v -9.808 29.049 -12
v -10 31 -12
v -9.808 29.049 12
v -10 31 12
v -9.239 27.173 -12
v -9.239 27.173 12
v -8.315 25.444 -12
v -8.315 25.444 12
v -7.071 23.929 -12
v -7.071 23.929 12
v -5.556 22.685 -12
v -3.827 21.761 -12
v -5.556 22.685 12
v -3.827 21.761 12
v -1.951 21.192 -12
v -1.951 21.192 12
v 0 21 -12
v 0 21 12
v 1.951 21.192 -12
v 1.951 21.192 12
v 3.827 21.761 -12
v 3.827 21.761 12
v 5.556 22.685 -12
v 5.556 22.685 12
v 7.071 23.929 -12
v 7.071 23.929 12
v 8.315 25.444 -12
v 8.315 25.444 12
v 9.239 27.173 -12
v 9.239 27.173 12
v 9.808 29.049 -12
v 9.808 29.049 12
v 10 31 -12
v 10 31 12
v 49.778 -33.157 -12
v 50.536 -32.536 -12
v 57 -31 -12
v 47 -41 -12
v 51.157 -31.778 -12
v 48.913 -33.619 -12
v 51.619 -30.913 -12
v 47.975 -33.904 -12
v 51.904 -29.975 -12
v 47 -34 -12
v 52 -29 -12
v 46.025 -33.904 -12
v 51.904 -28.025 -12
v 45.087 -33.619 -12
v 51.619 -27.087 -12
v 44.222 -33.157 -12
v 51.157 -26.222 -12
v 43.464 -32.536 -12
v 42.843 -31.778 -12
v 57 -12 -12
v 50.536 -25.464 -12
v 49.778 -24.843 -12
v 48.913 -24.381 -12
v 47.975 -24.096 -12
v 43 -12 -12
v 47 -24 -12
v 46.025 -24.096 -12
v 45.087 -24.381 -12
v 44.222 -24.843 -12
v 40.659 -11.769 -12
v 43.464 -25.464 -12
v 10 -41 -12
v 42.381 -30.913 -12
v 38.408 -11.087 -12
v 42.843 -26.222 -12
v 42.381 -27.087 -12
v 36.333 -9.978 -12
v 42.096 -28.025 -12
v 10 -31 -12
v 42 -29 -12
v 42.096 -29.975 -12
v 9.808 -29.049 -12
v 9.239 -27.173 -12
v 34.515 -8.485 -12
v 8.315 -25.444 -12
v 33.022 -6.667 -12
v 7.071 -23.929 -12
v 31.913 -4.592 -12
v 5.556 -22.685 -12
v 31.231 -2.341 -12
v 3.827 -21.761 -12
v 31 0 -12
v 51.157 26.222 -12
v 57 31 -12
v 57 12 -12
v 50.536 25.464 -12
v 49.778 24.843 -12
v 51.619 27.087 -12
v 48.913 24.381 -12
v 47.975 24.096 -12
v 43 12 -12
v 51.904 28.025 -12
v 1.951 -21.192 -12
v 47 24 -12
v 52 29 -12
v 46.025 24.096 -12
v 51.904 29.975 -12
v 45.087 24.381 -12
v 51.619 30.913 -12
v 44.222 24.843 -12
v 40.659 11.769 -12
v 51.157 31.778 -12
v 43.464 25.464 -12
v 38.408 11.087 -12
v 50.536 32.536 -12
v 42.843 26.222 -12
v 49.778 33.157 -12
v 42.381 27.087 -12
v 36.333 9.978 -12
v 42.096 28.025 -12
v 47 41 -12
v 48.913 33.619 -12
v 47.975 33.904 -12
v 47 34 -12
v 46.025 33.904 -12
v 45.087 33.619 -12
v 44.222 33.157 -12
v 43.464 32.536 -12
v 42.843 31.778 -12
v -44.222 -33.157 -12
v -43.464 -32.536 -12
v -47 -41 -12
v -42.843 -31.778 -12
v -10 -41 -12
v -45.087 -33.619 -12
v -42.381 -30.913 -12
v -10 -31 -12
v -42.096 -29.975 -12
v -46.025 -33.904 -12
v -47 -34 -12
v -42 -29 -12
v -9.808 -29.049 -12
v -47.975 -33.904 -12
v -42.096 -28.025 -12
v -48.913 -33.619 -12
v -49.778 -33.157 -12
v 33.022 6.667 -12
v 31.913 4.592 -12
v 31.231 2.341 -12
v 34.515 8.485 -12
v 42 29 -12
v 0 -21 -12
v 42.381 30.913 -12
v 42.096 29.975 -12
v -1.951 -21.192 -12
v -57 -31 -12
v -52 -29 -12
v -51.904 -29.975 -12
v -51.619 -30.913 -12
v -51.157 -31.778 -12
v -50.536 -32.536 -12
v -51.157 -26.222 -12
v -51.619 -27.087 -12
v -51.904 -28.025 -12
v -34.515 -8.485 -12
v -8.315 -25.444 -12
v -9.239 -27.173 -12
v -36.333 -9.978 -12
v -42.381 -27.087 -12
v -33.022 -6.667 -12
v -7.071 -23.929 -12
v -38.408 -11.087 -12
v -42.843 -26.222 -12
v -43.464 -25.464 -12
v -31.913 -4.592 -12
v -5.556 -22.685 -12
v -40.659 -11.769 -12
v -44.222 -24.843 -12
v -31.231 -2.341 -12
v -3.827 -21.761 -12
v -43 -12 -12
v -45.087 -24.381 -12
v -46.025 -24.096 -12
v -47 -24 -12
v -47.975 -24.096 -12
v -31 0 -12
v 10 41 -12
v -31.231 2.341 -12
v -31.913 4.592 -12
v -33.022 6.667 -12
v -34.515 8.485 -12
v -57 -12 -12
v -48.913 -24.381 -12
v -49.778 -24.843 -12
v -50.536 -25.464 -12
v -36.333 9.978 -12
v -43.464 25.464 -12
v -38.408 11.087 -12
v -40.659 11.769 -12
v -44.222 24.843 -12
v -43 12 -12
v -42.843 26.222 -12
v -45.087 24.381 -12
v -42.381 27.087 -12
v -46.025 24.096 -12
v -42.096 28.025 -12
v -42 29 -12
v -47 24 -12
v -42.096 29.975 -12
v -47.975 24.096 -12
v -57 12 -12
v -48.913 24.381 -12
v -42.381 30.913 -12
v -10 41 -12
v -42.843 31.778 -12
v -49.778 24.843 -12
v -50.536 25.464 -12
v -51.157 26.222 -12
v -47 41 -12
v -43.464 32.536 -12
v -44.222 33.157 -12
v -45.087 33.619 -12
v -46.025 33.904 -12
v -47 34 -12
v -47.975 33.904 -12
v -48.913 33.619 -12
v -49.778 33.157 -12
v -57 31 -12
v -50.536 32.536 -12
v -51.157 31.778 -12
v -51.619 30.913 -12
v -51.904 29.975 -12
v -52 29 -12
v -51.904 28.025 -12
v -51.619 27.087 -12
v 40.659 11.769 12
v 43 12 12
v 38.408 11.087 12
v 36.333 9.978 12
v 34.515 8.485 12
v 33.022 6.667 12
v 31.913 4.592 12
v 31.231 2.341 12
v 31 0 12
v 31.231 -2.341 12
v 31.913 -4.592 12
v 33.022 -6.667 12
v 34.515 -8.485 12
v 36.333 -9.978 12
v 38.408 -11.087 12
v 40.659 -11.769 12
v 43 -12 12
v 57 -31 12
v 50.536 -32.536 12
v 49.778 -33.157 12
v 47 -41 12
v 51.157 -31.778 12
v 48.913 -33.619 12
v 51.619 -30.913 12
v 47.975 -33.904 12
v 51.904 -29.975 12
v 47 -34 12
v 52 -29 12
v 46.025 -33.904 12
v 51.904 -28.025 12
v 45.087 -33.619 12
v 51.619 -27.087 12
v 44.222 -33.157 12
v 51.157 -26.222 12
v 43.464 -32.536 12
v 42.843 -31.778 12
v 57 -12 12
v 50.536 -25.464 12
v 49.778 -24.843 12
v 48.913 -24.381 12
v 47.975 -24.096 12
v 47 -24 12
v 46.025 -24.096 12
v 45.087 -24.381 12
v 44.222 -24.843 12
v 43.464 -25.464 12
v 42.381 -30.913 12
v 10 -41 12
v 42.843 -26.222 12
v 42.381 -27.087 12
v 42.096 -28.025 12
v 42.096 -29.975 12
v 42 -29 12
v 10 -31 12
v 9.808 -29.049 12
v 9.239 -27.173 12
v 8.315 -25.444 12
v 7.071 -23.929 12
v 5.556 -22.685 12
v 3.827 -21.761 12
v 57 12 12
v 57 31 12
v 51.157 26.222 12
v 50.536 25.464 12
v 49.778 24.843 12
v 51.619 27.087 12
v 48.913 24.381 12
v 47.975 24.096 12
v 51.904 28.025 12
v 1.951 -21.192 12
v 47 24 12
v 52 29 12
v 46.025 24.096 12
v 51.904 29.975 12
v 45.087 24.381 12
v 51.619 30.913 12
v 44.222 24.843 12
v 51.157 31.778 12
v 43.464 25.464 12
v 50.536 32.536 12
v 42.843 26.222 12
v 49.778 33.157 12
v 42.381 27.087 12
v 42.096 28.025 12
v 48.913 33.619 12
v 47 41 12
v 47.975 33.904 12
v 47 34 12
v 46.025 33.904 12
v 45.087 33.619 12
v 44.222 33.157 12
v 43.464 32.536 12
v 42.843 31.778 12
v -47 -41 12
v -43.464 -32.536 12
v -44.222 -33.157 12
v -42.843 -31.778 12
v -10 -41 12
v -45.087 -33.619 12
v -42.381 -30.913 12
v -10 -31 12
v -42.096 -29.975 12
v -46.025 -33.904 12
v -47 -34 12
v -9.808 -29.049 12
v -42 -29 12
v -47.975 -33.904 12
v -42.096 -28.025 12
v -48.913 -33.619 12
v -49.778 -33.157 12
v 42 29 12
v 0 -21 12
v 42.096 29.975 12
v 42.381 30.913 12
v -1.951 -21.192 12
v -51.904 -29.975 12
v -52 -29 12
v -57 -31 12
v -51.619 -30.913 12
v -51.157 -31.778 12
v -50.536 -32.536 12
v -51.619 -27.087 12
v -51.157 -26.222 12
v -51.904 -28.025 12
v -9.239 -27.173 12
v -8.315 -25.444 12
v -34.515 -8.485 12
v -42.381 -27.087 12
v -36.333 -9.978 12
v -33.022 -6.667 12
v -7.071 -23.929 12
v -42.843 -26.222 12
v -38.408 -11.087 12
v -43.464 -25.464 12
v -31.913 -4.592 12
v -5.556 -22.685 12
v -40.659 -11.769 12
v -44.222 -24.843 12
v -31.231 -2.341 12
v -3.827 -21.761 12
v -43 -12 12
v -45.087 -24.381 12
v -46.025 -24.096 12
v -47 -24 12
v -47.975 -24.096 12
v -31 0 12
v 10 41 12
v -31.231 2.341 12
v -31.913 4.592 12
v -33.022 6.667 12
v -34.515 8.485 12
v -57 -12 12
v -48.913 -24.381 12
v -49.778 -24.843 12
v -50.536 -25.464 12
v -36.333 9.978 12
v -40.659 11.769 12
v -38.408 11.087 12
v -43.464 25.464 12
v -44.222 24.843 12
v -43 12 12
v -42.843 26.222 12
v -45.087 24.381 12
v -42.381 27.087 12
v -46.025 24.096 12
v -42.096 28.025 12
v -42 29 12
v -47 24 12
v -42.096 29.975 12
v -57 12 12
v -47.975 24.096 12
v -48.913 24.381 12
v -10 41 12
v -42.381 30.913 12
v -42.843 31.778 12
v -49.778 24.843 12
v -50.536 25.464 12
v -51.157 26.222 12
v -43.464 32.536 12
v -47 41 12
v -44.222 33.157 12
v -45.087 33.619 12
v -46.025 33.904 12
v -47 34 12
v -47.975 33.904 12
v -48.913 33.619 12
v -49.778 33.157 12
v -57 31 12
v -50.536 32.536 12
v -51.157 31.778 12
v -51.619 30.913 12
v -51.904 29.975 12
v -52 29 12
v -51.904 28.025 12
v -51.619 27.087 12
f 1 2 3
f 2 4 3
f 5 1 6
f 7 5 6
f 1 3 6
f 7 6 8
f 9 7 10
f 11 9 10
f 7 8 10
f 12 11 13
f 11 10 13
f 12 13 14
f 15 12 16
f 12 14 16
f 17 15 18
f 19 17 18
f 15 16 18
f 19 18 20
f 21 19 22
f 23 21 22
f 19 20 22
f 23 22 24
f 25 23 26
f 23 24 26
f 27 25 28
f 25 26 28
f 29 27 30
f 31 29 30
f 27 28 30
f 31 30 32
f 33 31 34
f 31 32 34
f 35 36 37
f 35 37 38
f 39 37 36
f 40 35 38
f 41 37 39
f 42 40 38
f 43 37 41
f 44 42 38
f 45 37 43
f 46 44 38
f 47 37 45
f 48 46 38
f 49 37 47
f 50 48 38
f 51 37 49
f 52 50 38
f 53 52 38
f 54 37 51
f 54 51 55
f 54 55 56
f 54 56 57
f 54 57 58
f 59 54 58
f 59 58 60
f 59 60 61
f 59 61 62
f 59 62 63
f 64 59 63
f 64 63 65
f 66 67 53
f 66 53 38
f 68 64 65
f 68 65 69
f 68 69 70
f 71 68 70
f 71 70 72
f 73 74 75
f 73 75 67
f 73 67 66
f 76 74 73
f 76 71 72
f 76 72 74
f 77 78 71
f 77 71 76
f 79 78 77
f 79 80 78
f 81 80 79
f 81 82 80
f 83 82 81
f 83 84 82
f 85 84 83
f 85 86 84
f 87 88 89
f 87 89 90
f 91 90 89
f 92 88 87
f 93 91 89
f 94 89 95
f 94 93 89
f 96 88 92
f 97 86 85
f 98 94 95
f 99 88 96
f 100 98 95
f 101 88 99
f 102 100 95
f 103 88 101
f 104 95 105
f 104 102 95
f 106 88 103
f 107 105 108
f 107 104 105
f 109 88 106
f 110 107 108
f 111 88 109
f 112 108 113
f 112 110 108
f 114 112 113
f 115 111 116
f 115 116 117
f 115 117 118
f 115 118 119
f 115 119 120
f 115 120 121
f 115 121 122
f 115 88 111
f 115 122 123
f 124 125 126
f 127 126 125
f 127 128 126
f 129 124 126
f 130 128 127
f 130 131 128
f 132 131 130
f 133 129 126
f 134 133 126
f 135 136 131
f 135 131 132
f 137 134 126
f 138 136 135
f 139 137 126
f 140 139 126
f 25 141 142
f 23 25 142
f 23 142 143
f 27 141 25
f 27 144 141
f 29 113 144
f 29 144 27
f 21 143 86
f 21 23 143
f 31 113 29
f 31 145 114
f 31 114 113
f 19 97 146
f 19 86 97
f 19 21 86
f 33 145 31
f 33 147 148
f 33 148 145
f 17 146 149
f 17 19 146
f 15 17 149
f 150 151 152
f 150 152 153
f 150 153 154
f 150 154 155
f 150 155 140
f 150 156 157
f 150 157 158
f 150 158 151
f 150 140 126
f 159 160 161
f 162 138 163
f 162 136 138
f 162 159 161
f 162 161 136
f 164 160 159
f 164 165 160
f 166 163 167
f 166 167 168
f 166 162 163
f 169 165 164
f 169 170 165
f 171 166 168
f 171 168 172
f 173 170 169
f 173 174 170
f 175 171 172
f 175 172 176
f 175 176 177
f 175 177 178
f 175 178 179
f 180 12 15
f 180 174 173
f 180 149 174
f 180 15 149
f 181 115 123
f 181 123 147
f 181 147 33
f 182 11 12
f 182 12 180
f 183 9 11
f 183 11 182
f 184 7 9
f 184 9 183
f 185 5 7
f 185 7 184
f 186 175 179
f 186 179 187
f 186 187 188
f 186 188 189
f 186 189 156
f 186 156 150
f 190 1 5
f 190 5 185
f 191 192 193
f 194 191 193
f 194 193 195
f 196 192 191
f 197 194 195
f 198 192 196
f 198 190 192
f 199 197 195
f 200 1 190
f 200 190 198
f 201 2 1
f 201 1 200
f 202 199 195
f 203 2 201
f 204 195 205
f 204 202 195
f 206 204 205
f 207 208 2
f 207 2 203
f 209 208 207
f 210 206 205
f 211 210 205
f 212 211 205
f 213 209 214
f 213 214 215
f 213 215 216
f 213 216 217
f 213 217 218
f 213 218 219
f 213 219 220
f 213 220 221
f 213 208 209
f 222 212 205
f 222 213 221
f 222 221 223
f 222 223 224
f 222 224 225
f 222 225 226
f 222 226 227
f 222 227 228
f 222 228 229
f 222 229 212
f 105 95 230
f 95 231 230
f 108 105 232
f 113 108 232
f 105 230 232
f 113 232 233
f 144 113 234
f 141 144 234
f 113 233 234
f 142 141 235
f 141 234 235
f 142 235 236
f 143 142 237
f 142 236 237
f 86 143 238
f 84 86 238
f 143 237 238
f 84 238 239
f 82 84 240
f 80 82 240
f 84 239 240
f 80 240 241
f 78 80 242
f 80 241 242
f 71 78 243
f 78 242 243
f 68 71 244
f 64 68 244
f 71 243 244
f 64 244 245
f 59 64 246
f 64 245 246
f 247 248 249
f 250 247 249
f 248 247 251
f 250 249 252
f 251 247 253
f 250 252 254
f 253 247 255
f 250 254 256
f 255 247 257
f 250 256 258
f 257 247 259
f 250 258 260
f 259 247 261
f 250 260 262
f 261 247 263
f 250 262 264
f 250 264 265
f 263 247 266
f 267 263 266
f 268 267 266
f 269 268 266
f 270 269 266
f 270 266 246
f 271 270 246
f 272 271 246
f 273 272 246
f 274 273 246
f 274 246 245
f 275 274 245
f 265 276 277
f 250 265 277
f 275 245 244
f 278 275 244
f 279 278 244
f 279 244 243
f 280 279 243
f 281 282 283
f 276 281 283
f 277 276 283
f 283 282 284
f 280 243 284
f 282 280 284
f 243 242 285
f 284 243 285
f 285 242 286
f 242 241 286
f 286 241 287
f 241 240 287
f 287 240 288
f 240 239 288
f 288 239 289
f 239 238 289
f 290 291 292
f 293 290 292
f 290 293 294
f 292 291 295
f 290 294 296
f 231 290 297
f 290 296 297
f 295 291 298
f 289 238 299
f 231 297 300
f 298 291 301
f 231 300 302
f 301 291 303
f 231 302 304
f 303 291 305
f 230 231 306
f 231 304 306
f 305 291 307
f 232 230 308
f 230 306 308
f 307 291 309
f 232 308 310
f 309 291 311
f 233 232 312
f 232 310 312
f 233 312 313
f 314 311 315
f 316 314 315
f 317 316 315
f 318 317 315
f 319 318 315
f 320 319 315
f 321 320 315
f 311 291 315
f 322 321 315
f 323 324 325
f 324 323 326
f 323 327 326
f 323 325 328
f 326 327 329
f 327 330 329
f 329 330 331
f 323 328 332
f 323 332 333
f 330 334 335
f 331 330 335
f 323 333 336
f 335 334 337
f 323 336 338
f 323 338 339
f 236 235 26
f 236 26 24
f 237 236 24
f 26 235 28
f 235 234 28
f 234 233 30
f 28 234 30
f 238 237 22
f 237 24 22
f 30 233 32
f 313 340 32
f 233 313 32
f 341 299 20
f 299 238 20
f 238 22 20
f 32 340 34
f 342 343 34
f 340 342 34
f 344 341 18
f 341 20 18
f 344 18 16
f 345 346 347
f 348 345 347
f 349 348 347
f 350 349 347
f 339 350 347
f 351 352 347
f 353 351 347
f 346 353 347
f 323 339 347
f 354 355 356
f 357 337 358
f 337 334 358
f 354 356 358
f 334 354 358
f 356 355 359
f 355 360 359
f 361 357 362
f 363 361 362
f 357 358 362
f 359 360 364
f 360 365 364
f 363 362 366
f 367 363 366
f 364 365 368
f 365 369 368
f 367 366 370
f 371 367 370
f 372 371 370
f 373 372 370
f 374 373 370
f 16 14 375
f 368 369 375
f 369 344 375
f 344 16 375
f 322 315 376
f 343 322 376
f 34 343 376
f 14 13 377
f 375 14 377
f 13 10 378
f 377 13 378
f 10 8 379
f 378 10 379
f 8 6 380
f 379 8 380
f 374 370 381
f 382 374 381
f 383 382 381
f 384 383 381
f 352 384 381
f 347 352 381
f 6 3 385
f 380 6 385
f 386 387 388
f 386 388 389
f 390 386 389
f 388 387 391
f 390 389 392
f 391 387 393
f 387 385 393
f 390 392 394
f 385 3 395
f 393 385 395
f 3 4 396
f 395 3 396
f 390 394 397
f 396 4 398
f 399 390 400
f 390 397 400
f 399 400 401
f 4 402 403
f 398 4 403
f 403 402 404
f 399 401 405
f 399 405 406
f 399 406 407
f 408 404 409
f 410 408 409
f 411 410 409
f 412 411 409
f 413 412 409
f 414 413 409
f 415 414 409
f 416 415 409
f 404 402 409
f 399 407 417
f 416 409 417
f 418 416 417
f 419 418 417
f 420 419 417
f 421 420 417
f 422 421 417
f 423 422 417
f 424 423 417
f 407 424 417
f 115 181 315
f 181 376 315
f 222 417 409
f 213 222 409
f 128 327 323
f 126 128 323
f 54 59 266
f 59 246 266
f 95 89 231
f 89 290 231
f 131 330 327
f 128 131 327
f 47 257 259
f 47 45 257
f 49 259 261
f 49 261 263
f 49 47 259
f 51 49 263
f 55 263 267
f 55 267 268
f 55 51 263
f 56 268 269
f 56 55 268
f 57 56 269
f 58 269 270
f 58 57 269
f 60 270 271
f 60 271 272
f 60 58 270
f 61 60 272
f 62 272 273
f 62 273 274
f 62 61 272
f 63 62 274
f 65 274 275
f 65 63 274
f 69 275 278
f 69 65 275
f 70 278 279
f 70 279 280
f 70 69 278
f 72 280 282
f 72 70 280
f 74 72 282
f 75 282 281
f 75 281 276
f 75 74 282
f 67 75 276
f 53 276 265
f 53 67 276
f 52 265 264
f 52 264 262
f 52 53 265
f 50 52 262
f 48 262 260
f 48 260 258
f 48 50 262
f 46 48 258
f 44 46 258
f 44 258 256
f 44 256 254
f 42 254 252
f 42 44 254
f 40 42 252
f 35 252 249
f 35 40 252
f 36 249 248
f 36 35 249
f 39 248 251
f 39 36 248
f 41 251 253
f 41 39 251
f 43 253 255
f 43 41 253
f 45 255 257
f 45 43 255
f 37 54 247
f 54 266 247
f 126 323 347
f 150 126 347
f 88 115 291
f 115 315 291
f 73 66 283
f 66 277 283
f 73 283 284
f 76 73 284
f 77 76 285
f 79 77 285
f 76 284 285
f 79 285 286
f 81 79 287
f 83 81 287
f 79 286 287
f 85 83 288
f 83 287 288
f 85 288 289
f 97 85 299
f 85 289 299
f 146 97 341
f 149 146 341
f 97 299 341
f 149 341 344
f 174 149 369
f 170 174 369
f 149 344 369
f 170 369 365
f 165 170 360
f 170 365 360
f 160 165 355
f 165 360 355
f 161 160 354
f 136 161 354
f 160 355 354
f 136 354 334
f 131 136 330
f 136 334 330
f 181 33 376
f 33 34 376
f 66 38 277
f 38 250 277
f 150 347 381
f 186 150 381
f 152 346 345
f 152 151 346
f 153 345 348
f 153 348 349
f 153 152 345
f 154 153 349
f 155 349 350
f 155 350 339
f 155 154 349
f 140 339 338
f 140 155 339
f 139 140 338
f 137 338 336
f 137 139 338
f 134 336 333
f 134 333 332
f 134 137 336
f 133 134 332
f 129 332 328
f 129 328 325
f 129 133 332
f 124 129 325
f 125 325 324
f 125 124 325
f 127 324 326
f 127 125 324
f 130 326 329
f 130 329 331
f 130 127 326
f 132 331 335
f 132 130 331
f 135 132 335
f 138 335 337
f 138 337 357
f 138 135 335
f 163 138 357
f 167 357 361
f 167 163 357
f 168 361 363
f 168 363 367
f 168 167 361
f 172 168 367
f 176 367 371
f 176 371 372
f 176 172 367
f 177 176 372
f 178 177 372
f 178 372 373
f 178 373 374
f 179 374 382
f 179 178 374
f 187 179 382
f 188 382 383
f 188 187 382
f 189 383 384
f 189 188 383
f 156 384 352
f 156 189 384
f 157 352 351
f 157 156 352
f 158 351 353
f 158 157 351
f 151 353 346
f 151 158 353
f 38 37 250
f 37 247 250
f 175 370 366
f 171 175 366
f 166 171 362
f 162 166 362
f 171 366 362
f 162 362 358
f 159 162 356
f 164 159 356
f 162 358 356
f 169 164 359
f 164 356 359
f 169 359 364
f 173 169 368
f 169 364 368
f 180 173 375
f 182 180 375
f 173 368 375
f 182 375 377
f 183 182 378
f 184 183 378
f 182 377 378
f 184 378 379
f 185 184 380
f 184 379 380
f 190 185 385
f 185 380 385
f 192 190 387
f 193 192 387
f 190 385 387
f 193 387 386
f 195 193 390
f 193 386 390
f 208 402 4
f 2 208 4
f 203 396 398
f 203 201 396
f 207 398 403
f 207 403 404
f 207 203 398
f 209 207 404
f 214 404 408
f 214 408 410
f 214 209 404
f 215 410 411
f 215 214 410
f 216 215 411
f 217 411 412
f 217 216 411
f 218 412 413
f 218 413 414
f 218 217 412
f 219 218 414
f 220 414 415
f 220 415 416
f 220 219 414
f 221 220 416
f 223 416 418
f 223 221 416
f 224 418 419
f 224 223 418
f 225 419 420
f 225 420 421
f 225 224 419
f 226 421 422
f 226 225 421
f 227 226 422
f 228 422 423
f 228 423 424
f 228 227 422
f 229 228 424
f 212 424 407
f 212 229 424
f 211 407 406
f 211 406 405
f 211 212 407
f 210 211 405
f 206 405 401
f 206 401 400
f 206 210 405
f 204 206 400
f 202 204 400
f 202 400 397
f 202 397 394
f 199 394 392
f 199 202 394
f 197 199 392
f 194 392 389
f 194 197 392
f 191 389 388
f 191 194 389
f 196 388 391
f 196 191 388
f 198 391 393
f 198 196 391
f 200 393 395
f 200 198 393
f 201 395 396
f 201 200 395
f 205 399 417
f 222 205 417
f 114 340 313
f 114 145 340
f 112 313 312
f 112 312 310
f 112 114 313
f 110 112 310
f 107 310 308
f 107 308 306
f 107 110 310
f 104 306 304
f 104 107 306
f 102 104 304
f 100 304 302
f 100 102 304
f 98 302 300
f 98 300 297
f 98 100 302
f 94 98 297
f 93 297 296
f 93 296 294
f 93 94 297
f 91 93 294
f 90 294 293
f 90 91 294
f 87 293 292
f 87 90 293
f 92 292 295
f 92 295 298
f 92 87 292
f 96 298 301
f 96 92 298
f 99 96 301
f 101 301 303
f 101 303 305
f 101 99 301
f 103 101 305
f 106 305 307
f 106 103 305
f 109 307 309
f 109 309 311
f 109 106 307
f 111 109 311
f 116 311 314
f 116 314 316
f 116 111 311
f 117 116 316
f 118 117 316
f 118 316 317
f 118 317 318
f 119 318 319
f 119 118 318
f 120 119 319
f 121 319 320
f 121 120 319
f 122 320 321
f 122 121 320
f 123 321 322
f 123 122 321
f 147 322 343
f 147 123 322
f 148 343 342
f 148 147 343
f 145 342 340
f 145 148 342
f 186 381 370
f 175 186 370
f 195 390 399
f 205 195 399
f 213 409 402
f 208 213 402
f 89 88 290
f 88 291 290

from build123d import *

# Parameters (mm, degrees)
SKETCH1_R           = 5
BOSS_EXTRUDE1_DEPTH = 12


with BuildPart() as part:
    # Sketch1 → Boss-Extrude1 (new, symmetric)
    with BuildSketch(Plane.XY):
        with BuildLine():
            Line((-10, 41), (-10, 31))
            ThreePointArc((-10, 31), (0, 21), (10, 31))
            Line((10, 31), (10, 41))
            Line((10, 41), (47, 41))
            Line((47, 41), (57, 31))
            Line((57, 31), (57, 12))
            Line((57, 12), (43, 12))
            ThreePointArc((43, 12), (31, 0), (43, -12))
            Line((43, -12), (57, -12))
            Line((57, -12), (57, -31))
            Line((57, -31), (47, -41))
            Line((47, -41), (10, -41))
            Line((10, -41), (10, -31))
            ThreePointArc((10, -31), (0, -21), (-10, -31))
            Line((-10, -31), (-10, -41))
            Line((-10, -41), (-47, -41))
            Line((-47, -41), (-57, -31))
            Line((-57, -31), (-57, -12))
            Line((-57, -12), (-43, -12))
            ThreePointArc((-43, -12), (-31, 0), (-43, 12))
            Line((-43, 12), (-57, 12))
            Line((-57, 12), (-57, 31))
            Line((-57, 31), (-47, 41))
            Line((-47, 41), (-10, 41))
        make_face()
        with Locations((-47, 29)):
            Circle(SKETCH1_R, mode=Mode.SUBTRACT)
        with Locations(Location((47, 29, 0), (0, 0, 180))):
            Circle(SKETCH1_R, mode=Mode.SUBTRACT)
        with Locations(Location((-47, -29, 0), (0, 0, 180))):
            Circle(SKETCH1_R, mode=Mode.SUBTRACT)
        with Locations((47, -29)):
            Circle(SKETCH1_R, mode=Mode.SUBTRACT)
    extrude(amount=BOSS_EXTRUDE1_DEPTH, both=True)


solid = part.part
